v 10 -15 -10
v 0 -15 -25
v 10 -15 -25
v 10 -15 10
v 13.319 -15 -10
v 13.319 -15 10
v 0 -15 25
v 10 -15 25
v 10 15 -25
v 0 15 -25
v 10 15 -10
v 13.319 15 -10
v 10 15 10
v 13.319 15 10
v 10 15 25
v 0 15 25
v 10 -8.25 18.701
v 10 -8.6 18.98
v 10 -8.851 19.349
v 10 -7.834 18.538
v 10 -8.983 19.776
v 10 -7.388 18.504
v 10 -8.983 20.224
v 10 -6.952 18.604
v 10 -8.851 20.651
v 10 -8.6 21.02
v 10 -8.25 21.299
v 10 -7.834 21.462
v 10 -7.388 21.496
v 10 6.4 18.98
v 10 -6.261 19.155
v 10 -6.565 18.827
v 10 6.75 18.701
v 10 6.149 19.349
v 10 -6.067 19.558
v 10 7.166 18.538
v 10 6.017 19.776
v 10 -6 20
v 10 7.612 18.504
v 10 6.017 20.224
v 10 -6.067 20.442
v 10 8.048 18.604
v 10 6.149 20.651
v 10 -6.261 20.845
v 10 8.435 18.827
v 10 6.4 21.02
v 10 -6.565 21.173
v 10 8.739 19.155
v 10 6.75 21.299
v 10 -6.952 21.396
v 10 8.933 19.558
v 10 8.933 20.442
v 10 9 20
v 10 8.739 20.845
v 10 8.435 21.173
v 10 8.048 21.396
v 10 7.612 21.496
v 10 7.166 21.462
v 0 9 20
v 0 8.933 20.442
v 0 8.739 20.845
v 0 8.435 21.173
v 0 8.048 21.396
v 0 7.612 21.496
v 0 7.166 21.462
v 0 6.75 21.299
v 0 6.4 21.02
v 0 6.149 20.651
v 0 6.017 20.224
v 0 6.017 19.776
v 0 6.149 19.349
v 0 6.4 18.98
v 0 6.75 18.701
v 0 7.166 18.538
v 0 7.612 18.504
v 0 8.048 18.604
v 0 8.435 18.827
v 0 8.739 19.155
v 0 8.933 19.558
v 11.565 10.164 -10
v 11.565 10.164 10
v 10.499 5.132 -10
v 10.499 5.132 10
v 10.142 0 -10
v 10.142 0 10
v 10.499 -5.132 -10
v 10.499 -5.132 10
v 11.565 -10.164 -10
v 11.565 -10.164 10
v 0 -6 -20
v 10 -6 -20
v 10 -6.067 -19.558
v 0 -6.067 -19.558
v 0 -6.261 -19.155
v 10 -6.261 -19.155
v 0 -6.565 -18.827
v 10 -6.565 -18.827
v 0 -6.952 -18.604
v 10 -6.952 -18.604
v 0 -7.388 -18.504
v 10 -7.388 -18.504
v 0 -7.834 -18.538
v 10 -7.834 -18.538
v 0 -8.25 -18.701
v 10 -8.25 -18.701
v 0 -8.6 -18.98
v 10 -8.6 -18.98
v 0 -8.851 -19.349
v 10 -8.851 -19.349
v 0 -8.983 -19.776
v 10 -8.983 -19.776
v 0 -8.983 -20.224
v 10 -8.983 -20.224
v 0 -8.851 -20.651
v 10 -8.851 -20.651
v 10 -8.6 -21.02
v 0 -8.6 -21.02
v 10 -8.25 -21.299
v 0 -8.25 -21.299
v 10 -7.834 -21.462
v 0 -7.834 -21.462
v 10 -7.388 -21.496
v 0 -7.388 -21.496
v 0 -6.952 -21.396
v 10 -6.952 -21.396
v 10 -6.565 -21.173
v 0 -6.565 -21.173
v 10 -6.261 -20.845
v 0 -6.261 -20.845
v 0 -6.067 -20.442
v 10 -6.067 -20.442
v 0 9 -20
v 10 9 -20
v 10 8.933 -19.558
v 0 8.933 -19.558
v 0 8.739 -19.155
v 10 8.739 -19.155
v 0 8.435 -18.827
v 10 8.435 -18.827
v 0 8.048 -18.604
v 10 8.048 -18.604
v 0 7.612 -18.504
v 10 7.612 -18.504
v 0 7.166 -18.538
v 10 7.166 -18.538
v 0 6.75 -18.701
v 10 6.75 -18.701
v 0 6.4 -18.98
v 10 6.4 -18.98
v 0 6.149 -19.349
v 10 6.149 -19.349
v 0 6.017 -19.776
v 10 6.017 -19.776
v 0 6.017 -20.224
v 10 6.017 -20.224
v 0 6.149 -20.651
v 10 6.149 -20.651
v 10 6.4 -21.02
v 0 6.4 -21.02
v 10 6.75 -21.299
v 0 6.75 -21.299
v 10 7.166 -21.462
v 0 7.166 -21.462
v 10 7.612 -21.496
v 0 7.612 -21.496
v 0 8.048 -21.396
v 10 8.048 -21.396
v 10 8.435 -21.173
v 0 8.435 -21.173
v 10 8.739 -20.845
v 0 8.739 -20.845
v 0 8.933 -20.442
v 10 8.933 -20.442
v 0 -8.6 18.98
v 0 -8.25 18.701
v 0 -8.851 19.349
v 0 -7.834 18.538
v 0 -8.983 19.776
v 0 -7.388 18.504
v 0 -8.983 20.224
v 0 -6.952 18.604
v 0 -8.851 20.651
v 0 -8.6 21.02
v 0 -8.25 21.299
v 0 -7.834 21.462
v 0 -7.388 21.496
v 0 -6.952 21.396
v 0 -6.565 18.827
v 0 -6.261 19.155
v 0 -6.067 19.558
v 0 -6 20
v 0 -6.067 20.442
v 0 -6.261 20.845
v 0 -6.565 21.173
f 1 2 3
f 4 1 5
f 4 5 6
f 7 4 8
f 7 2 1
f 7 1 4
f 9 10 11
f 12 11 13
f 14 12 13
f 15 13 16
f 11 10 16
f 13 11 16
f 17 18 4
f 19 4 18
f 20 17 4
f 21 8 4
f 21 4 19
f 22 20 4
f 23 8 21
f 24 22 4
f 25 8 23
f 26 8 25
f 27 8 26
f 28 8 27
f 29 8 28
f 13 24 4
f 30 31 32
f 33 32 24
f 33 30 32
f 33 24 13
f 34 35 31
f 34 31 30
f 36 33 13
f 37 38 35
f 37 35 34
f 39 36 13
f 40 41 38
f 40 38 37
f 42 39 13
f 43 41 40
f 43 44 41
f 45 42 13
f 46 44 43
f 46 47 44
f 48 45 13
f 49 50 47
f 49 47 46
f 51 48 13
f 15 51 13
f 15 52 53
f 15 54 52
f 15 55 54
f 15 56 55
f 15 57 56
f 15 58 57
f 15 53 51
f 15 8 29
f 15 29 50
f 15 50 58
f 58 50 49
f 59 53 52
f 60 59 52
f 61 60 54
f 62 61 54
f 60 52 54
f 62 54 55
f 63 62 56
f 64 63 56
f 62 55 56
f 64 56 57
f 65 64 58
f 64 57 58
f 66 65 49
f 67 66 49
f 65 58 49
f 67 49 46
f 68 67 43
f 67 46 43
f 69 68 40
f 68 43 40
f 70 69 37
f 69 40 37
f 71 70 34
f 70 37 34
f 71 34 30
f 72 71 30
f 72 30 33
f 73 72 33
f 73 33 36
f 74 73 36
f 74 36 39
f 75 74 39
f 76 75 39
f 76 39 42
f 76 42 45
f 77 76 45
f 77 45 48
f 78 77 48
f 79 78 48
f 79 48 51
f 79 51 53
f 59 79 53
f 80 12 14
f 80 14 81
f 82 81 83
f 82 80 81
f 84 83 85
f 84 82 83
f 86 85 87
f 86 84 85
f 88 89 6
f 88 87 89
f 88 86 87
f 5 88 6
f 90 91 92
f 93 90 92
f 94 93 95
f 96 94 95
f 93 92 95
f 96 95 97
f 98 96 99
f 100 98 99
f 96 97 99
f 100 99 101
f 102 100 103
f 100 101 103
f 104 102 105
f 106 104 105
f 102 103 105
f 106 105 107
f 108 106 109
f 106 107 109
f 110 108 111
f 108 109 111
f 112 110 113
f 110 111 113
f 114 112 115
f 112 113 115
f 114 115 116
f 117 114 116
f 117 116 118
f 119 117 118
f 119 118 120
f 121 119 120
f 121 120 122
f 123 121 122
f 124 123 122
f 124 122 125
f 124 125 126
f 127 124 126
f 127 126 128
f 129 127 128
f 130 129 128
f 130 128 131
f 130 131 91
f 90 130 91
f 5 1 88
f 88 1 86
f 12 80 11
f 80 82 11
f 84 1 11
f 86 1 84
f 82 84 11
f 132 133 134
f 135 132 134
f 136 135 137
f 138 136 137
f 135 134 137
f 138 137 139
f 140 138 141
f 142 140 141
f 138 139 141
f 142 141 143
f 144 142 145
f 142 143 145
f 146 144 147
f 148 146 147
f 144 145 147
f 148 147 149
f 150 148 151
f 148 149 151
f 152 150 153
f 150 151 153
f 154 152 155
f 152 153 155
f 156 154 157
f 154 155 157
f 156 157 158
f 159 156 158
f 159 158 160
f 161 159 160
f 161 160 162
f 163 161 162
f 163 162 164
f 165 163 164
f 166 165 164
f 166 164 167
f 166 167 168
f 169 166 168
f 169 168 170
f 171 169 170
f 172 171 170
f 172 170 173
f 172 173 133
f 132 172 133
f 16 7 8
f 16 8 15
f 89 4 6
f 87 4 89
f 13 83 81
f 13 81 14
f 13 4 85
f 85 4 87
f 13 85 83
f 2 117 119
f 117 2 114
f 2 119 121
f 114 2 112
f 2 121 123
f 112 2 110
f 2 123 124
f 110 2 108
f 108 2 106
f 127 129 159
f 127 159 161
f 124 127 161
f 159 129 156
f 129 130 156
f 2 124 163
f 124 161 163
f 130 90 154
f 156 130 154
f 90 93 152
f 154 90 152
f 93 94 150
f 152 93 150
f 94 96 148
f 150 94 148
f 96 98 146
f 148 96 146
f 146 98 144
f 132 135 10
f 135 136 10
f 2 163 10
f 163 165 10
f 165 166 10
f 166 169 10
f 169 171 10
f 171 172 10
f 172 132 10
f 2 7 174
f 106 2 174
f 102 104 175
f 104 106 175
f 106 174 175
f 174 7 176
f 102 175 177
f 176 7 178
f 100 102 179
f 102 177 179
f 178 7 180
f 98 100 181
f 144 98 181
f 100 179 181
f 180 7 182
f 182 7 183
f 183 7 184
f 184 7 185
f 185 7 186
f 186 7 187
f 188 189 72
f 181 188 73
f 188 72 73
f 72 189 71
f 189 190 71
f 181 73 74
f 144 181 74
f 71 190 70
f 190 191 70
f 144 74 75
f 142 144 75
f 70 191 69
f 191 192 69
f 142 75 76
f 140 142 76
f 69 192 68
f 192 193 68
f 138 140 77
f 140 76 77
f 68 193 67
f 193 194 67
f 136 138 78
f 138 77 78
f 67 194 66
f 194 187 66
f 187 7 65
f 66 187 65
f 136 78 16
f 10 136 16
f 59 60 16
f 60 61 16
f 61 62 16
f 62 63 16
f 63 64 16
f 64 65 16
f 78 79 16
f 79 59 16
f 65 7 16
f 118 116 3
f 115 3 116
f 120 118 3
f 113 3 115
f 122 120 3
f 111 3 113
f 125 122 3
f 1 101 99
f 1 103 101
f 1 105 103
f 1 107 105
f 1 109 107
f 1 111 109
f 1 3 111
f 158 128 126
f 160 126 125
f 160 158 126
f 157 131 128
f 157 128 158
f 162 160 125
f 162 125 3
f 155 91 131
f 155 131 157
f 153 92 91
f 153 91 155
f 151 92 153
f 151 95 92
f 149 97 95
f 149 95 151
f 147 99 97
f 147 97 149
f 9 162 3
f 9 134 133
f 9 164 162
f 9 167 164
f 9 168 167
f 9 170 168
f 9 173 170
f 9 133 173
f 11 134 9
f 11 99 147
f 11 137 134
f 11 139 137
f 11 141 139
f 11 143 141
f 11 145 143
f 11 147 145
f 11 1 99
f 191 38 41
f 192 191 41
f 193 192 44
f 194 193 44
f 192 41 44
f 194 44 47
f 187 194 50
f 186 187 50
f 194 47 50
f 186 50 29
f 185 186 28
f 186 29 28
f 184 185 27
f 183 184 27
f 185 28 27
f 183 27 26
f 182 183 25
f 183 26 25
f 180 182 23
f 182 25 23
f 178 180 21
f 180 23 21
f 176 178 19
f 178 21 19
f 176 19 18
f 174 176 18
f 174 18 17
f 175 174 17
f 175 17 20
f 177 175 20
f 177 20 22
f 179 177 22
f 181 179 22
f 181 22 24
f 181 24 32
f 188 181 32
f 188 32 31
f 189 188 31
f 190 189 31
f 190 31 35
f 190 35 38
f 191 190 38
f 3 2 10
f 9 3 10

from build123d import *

# Parameters (mm, degrees)
F0_W     = 30
F0_H     = 50
F1_DEPTH = 10
F2_W     = 30
F2_H     = 20
F3_DEPTH = 10
F4_R     = 37
F5_DEPTH = 25.001
F6_DEPTH = 25.001
F7_R     = 1.5
F8_DEPTH = 10.001


with BuildPart() as f1:
    # F0 (on Right) → F1 (new body)
    with BuildSketch(Plane.YZ):
        Rectangle(F0_W, F0_H)
    extrude(amount=F1_DEPTH)

    # F2 (on face) → F3 (join)
    with BuildSketch(Plane.YZ.offset(10)):
        Rectangle(F2_W, F2_H)
    extrude(amount=F3_DEPTH)

    # F4 (on Top) → F5 (cut, through all)
    with BuildSketch(Plane.XY):
        with Locations((47.141809, 0)):
            Circle(F4_R)
    extrude(amount=-F5_DEPTH, mode=Mode.SUBTRACT)

    # F4 (on Top) → F6 (cut, through all)
    with BuildSketch(Plane.XY):
        with Locations((47.141809, 0)):
            Circle(F4_R)
    extrude(amount=F6_DEPTH, mode=Mode.SUBTRACT)

    # F7 (on face) → F8 (cut, through all)
    with BuildSketch(Plane.YZ.offset(10)):
        with Locations((-7.5, 20)):
            Circle(F7_R)
        with Locations((7.5, 20)):
            Circle(F7_R)
        with Locations((-7.5, -20)):
            Circle(F7_R)
        with Locations((7.5, -20)):
            Circle(F7_R)
    extrude(amount=-F8_DEPTH, mode=Mode.SUBTRACT)


solid = f1.part
